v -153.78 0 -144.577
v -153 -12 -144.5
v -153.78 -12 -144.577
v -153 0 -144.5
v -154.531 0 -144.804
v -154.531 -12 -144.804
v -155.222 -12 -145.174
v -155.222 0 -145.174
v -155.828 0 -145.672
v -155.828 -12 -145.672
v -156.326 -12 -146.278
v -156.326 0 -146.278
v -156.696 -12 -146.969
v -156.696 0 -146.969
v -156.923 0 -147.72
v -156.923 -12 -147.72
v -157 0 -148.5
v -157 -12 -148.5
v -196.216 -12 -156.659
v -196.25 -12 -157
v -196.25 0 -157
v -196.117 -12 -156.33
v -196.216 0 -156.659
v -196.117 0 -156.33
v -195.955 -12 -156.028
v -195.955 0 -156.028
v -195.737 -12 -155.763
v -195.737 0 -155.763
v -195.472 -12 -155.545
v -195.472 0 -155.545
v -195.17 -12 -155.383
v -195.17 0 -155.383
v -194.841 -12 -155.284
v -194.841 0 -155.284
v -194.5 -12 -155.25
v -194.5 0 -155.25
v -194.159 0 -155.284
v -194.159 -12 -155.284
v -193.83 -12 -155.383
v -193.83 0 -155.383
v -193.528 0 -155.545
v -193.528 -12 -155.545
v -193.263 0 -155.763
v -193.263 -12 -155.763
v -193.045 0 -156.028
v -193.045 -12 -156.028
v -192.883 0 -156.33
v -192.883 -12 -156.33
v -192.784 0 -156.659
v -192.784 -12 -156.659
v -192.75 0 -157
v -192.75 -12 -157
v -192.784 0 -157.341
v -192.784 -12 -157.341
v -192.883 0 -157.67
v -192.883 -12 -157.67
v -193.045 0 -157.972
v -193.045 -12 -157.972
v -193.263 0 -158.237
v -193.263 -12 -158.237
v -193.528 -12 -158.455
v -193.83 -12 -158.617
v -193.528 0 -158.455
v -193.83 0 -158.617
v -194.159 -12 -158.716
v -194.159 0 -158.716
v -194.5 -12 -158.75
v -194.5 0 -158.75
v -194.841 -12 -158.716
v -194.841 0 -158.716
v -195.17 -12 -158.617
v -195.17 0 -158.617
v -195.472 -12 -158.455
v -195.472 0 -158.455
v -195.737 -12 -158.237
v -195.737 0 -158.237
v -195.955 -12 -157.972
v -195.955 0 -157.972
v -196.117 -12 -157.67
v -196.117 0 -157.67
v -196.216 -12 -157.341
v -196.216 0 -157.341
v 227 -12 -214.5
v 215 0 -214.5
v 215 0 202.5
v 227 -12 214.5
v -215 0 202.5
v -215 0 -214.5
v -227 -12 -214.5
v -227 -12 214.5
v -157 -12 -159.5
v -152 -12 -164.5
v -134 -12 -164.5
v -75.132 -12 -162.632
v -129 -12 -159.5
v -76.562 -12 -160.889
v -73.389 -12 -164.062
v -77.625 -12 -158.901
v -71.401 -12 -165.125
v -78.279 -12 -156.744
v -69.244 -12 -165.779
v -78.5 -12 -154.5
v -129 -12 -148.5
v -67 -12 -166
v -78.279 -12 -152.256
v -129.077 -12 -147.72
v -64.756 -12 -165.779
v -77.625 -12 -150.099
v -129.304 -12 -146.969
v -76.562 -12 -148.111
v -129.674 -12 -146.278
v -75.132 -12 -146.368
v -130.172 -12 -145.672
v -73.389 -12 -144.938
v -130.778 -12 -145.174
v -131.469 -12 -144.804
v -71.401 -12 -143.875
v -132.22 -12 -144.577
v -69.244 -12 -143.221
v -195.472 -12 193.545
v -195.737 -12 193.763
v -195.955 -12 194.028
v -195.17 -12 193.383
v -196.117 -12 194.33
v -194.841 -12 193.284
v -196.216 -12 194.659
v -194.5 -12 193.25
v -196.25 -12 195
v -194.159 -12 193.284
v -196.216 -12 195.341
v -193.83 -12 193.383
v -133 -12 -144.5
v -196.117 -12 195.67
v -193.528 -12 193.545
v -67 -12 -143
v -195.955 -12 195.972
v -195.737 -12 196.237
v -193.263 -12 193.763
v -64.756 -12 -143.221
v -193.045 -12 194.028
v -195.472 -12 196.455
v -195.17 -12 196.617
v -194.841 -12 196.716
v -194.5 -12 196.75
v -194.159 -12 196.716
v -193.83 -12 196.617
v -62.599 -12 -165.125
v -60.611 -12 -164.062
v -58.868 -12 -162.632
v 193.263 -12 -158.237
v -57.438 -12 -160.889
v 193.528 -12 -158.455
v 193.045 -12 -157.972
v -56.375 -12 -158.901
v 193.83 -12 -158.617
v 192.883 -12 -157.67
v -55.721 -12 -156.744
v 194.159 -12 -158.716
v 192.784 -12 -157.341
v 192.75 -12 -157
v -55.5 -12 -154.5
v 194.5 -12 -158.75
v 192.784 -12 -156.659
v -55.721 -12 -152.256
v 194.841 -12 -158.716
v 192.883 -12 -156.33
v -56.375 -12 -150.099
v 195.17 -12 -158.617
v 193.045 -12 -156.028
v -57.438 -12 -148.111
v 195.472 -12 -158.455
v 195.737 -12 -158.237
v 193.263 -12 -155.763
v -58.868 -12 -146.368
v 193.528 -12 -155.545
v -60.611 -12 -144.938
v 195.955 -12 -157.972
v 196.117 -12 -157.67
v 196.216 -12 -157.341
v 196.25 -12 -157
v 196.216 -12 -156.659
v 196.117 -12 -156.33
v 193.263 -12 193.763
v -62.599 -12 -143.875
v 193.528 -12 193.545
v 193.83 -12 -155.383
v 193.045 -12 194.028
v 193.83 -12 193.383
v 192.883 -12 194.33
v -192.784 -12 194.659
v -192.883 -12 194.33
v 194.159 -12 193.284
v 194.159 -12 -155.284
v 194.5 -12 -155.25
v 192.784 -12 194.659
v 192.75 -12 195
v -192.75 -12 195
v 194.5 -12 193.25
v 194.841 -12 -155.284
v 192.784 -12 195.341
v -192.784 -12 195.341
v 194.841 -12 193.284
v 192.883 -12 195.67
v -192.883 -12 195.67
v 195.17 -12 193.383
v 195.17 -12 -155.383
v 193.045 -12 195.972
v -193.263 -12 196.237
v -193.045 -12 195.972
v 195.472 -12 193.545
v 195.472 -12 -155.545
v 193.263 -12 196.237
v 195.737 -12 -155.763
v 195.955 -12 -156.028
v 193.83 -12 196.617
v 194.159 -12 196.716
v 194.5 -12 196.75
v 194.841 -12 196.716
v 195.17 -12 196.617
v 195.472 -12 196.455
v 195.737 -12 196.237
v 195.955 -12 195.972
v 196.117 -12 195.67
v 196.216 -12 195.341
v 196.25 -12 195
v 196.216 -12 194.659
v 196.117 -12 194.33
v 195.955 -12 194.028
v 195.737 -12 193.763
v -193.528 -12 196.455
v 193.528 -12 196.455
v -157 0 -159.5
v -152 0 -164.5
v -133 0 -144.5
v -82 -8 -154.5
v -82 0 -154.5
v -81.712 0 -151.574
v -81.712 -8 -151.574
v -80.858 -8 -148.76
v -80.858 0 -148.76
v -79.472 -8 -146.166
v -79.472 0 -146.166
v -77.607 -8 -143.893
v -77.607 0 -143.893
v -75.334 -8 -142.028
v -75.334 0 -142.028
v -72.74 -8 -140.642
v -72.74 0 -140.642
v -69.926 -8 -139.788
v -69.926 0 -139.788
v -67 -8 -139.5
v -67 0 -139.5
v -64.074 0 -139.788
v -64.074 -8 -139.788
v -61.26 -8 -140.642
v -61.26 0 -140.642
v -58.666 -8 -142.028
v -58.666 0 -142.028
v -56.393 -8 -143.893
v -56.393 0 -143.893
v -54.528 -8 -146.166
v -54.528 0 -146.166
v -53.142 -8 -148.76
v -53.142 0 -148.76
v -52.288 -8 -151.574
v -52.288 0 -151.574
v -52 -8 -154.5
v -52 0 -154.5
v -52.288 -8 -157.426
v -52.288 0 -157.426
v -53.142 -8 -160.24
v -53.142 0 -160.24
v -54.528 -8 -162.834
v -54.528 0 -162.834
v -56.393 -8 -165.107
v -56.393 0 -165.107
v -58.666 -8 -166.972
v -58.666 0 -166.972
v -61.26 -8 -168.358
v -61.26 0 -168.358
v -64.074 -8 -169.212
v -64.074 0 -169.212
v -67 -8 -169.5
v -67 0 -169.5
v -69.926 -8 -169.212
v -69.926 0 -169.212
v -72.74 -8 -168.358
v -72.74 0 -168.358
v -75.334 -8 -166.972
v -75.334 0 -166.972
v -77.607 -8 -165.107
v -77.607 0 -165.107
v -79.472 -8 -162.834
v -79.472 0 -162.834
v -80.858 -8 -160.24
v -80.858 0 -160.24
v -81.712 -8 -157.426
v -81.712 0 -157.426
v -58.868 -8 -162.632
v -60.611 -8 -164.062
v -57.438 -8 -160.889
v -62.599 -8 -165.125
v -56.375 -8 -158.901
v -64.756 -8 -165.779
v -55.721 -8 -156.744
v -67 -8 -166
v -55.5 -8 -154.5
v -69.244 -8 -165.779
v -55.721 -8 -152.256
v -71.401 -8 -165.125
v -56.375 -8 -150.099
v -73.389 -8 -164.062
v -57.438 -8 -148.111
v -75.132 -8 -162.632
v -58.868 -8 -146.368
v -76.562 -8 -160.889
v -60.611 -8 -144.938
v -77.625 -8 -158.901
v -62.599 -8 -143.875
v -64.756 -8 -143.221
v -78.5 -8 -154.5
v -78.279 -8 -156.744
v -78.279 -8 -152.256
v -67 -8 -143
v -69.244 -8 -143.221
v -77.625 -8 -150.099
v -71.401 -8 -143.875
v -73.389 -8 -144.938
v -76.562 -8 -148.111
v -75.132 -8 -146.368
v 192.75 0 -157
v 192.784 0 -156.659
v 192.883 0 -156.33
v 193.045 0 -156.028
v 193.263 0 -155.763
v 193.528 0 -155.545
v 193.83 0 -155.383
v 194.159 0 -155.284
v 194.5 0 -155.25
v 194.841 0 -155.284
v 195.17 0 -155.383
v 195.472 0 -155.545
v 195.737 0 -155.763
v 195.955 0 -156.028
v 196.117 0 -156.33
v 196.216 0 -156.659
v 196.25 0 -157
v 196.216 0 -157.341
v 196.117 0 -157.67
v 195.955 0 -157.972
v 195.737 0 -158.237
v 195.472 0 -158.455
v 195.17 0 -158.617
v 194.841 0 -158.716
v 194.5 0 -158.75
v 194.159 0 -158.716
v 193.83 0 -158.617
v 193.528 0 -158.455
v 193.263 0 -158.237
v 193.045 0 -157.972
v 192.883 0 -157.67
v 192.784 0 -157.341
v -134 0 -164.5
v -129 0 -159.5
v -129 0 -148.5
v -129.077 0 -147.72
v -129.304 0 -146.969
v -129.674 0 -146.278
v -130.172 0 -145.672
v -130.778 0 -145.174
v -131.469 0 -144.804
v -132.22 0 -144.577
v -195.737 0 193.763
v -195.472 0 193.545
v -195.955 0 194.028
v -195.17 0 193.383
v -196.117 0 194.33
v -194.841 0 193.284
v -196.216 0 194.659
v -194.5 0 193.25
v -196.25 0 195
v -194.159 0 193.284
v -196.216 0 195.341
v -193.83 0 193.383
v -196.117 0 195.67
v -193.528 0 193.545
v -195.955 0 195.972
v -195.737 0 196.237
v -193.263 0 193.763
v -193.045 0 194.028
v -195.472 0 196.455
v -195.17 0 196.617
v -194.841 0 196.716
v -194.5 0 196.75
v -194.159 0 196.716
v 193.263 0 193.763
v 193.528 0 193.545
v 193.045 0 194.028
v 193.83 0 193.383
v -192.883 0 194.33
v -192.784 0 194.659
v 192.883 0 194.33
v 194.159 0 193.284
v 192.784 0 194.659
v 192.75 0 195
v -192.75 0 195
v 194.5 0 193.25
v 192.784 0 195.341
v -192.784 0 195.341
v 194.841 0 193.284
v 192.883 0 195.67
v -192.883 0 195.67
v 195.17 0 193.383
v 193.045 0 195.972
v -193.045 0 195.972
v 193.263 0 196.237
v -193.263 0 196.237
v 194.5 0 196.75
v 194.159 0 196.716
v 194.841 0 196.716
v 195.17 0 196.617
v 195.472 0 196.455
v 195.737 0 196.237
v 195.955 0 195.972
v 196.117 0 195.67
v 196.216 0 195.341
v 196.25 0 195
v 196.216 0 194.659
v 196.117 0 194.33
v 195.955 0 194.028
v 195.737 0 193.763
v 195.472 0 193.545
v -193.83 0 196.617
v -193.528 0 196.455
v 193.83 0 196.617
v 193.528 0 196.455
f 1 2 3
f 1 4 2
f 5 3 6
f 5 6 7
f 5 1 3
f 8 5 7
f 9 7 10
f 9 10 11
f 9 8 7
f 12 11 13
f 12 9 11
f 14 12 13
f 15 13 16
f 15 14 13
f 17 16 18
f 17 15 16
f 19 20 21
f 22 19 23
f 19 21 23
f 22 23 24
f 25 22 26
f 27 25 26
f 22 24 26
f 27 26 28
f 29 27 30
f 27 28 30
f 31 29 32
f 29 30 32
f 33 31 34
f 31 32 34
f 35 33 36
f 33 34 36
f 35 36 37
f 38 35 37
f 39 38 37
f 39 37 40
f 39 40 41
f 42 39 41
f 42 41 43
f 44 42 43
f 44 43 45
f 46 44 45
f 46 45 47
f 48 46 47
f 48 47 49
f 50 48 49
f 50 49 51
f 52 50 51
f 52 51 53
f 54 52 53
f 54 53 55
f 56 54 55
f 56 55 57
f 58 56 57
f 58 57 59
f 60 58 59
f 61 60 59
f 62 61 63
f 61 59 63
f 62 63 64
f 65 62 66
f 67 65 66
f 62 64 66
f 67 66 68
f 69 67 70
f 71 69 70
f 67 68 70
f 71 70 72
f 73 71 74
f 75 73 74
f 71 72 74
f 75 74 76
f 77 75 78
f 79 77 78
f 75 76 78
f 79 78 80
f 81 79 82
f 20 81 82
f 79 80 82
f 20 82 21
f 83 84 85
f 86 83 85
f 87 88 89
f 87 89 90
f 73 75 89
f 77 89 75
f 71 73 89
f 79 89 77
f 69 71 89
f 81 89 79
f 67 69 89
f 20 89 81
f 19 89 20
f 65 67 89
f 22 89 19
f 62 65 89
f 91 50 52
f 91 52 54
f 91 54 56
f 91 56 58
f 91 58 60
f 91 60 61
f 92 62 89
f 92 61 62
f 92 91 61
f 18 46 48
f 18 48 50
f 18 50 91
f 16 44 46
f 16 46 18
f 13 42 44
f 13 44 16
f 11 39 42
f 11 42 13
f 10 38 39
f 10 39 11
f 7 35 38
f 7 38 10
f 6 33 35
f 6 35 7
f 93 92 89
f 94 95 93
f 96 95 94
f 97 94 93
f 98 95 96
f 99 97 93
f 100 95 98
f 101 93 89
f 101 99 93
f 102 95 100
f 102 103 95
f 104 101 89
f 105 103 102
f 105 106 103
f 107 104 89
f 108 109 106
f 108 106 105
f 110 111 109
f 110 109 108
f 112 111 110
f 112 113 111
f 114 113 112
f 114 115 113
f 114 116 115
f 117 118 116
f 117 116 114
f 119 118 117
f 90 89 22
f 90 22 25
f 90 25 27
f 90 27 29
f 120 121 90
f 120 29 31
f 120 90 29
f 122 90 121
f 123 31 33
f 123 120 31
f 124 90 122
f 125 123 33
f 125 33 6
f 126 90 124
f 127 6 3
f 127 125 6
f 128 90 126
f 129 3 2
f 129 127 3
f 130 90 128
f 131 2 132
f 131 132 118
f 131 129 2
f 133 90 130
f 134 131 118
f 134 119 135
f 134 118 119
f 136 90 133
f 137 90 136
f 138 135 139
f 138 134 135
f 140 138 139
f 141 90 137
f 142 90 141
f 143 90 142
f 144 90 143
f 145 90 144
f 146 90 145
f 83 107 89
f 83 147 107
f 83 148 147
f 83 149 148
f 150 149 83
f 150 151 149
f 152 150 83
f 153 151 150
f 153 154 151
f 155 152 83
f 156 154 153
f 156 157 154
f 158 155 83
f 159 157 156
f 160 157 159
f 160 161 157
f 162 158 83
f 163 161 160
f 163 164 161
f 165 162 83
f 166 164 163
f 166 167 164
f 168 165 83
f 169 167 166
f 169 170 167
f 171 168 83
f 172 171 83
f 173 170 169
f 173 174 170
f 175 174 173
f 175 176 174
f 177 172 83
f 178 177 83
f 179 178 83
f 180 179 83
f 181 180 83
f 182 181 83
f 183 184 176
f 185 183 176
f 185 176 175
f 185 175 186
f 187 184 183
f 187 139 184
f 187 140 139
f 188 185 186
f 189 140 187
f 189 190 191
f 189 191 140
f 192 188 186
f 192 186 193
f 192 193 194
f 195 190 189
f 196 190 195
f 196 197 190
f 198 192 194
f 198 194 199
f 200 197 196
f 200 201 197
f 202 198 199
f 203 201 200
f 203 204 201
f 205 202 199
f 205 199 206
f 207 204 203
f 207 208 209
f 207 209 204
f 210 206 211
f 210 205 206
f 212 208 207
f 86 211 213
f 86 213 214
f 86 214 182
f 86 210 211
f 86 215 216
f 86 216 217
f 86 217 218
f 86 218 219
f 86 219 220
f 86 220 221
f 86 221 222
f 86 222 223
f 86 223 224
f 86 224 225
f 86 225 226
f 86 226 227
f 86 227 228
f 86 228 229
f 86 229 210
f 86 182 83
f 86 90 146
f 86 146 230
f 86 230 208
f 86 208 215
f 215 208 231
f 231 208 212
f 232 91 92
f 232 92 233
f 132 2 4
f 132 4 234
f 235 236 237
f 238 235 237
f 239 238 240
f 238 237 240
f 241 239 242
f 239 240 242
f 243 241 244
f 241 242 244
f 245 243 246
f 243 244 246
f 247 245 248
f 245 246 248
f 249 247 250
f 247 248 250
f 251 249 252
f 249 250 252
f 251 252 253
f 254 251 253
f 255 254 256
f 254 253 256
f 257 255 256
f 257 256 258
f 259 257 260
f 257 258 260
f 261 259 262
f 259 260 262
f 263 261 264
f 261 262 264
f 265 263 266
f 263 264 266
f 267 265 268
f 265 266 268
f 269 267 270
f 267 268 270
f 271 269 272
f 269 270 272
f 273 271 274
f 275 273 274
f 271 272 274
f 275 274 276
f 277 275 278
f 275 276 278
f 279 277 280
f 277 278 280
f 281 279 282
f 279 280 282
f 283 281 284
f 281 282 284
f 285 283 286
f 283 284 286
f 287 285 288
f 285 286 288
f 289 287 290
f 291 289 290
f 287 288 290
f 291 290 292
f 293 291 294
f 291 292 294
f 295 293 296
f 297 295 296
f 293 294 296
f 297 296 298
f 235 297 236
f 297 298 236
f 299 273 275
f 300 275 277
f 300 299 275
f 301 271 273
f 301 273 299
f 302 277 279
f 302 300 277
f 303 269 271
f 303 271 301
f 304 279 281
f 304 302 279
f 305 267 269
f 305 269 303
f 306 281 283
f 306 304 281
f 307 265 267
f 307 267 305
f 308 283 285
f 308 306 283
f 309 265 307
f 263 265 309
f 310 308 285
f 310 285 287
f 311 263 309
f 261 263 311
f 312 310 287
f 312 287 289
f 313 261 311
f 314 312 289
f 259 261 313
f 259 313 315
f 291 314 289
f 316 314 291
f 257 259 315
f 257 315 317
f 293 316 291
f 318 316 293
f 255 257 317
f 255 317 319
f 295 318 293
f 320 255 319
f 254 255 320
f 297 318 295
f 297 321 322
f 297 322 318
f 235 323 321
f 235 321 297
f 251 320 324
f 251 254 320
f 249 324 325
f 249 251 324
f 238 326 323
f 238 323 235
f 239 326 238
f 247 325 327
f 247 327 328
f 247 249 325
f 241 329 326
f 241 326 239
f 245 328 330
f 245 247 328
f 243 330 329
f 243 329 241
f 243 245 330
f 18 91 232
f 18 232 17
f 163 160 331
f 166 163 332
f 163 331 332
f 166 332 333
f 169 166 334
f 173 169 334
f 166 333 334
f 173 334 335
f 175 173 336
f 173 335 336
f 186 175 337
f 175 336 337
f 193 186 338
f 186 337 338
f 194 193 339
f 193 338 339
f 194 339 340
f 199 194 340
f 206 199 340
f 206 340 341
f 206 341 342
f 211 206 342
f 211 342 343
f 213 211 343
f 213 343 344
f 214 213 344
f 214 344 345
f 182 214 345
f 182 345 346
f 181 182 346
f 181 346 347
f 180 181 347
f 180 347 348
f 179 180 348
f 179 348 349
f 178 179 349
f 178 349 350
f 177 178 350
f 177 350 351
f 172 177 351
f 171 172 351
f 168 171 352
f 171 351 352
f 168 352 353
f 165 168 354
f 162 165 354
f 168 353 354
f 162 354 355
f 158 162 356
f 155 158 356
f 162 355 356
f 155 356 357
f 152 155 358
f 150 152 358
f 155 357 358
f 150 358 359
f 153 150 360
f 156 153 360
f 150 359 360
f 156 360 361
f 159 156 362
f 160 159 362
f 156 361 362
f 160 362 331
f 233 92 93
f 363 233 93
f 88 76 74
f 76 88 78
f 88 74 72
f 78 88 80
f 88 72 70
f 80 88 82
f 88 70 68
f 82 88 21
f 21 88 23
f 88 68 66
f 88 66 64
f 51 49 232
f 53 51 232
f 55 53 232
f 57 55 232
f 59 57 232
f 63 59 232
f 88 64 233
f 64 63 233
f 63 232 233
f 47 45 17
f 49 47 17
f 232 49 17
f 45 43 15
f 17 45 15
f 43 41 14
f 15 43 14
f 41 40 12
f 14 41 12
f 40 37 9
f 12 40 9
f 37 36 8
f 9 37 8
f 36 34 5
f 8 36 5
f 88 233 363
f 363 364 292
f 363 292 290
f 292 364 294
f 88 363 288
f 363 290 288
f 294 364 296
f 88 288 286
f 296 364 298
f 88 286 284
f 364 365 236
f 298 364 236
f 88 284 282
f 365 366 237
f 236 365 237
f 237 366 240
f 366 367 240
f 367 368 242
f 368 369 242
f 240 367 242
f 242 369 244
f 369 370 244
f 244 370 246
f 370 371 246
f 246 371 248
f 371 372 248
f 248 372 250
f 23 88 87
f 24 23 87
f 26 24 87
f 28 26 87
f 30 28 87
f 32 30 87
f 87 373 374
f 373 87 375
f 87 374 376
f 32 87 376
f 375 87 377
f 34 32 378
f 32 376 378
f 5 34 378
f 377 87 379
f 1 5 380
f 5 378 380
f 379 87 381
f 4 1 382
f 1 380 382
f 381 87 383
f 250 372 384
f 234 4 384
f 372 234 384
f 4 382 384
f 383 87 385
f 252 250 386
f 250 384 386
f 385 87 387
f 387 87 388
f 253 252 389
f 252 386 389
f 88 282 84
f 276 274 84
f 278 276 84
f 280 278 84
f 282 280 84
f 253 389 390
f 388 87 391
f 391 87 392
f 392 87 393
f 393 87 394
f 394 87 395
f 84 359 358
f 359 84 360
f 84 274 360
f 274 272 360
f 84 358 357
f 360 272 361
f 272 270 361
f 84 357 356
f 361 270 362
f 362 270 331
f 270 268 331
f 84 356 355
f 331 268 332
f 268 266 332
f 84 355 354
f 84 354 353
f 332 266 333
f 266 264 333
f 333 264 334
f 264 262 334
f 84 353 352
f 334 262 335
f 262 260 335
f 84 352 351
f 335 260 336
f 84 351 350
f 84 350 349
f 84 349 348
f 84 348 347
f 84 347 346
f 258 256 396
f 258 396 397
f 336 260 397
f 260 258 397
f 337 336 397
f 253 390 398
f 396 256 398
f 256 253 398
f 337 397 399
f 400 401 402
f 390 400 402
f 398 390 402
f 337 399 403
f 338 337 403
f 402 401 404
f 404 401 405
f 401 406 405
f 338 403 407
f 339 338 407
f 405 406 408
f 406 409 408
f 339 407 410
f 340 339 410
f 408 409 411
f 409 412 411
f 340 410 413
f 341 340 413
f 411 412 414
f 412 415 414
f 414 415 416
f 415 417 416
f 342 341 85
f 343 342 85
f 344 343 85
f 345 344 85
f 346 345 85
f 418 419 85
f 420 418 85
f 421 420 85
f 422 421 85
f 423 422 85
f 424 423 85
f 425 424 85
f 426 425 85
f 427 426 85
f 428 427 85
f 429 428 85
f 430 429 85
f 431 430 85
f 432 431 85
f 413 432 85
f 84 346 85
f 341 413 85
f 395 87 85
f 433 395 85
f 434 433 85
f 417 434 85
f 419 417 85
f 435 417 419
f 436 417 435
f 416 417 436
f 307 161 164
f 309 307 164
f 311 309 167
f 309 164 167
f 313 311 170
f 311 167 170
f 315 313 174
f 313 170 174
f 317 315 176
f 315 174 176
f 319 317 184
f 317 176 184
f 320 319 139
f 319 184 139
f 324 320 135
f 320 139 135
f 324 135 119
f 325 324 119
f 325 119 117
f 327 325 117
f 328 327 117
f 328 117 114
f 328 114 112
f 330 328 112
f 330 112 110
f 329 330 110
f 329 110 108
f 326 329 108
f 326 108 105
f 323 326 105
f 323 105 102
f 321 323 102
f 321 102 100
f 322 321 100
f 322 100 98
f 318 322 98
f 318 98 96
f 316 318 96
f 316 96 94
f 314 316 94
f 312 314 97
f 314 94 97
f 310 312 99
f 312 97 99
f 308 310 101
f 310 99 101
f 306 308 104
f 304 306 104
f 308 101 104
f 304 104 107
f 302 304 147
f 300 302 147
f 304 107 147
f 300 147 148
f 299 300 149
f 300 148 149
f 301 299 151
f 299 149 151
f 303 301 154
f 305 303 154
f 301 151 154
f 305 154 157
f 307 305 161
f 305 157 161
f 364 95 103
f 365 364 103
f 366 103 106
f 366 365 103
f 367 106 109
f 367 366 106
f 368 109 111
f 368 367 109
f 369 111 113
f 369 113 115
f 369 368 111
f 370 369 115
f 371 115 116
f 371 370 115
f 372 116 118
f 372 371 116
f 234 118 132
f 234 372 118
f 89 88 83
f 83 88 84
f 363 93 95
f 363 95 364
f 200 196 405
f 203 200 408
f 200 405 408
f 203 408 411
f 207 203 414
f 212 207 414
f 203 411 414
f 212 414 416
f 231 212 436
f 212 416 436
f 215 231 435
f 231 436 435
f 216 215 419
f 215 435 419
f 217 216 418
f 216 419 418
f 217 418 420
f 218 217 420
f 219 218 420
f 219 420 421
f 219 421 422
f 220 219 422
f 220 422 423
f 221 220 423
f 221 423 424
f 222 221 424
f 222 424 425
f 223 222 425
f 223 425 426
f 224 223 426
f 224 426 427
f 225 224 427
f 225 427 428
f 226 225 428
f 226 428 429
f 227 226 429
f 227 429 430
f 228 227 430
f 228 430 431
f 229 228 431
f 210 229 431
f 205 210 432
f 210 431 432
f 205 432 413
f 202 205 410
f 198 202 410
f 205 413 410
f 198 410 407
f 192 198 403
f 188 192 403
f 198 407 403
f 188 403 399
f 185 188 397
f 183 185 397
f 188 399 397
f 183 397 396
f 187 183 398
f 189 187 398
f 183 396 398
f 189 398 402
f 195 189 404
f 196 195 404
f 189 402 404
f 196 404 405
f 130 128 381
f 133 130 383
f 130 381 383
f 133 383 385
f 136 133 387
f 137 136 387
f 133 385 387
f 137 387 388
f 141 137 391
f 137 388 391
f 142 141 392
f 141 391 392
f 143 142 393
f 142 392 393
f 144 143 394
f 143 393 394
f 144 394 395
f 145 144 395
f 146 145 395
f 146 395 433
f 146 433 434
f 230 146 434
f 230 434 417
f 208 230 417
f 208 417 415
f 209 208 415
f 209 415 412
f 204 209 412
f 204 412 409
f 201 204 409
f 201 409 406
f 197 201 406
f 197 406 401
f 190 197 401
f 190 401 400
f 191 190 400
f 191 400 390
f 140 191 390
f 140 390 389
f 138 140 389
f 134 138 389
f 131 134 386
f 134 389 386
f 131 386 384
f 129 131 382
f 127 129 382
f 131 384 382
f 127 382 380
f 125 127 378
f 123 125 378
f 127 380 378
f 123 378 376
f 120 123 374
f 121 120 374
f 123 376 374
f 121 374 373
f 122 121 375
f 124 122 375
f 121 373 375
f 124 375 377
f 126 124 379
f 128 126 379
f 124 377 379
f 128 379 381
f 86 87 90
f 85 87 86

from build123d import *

# Parameters (mm, degrees)
F0_W      = 454
F0_H      = 429
F1_DEPTH  = 12
F2_SIZE   = 11.99999
F3_W      = 28
F3_H      = 20
F3_R      = 11.5
F4_DEPTH  = 25
F5_R      = 4
F6_SIZE   = 5
F8_D      = 3.5
F9_R      = 15
F9_R_2    = 11.5
F10_DEPTH = 8


# Not quite as in the source:
# - a fillet or chamfer is up to 0.001 mm smaller than in the source, because OpenCascade refuses the exact size


with BuildPart() as f1:
    # F0 (on Front) → F1 (new body)
    with BuildSketch(Plane.XZ):
        Rectangle(F0_W, F0_H)
    extrude(amount=F1_DEPTH)

    # F2 (size 12 in the source; OpenCascade refuses exactly that, so slightly less here)
    f2_edges = [f1.edges().sort_by_distance(p)[0] for p in [
        (227, 0, 0),
        (-227, 0, 0),
        (0, 0, 214.5),
    ]]
    chamfer(f2_edges, length=F2_SIZE)

    # F3 (on face) → F4 (cut)
    with BuildSketch(Plane.XZ.offset(12)):
        with Locations((-143, -154.5)):
            Rectangle(F3_W, F3_H)
        with Locations((-67, -154.5)):
            Circle(F3_R)
    extrude(amount=-F4_DEPTH, mode=Mode.SUBTRACT)

    # F5
    f5_edges = [f1.edges().sort_by_distance(p)[0] for p in [
        (-129, -6, -144.5),
        (-157, -6, -144.5),
    ]]
    fillet(f5_edges, radius=F5_R)

    # F6
    f6_edges = [f1.edges().sort_by_distance(p)[0] for p in [
        (-157, -6, -164.5),
        (-129, -6, -164.5),
    ]]
    chamfer(f6_edges, length=F6_SIZE)

    # F8 (through all)
    with Locations(Plane.XZ.offset(12)):
        with Locations((-194.5, 195), (194.5, 195), (194.5, -157), (-194.5, -157)):
            Hole(F8_D / 2)

    # F9 (on face) → F10 (cut)
    with BuildSketch(Plane(origin=(0, 0, 0), x_dir=(-1, 0, 0), z_dir=(0, 1, 0))):
        with Locations((67, -154.5)):
            Circle(F9_R)
        with Locations((67, -154.5)):
            Circle(F9_R_2, mode=Mode.SUBTRACT)
        with Locations((67, -154.5)):
            Circle(F9_R_2)
    extrude(amount=-F10_DEPTH, mode=Mode.SUBTRACT)


solid = f1.part
